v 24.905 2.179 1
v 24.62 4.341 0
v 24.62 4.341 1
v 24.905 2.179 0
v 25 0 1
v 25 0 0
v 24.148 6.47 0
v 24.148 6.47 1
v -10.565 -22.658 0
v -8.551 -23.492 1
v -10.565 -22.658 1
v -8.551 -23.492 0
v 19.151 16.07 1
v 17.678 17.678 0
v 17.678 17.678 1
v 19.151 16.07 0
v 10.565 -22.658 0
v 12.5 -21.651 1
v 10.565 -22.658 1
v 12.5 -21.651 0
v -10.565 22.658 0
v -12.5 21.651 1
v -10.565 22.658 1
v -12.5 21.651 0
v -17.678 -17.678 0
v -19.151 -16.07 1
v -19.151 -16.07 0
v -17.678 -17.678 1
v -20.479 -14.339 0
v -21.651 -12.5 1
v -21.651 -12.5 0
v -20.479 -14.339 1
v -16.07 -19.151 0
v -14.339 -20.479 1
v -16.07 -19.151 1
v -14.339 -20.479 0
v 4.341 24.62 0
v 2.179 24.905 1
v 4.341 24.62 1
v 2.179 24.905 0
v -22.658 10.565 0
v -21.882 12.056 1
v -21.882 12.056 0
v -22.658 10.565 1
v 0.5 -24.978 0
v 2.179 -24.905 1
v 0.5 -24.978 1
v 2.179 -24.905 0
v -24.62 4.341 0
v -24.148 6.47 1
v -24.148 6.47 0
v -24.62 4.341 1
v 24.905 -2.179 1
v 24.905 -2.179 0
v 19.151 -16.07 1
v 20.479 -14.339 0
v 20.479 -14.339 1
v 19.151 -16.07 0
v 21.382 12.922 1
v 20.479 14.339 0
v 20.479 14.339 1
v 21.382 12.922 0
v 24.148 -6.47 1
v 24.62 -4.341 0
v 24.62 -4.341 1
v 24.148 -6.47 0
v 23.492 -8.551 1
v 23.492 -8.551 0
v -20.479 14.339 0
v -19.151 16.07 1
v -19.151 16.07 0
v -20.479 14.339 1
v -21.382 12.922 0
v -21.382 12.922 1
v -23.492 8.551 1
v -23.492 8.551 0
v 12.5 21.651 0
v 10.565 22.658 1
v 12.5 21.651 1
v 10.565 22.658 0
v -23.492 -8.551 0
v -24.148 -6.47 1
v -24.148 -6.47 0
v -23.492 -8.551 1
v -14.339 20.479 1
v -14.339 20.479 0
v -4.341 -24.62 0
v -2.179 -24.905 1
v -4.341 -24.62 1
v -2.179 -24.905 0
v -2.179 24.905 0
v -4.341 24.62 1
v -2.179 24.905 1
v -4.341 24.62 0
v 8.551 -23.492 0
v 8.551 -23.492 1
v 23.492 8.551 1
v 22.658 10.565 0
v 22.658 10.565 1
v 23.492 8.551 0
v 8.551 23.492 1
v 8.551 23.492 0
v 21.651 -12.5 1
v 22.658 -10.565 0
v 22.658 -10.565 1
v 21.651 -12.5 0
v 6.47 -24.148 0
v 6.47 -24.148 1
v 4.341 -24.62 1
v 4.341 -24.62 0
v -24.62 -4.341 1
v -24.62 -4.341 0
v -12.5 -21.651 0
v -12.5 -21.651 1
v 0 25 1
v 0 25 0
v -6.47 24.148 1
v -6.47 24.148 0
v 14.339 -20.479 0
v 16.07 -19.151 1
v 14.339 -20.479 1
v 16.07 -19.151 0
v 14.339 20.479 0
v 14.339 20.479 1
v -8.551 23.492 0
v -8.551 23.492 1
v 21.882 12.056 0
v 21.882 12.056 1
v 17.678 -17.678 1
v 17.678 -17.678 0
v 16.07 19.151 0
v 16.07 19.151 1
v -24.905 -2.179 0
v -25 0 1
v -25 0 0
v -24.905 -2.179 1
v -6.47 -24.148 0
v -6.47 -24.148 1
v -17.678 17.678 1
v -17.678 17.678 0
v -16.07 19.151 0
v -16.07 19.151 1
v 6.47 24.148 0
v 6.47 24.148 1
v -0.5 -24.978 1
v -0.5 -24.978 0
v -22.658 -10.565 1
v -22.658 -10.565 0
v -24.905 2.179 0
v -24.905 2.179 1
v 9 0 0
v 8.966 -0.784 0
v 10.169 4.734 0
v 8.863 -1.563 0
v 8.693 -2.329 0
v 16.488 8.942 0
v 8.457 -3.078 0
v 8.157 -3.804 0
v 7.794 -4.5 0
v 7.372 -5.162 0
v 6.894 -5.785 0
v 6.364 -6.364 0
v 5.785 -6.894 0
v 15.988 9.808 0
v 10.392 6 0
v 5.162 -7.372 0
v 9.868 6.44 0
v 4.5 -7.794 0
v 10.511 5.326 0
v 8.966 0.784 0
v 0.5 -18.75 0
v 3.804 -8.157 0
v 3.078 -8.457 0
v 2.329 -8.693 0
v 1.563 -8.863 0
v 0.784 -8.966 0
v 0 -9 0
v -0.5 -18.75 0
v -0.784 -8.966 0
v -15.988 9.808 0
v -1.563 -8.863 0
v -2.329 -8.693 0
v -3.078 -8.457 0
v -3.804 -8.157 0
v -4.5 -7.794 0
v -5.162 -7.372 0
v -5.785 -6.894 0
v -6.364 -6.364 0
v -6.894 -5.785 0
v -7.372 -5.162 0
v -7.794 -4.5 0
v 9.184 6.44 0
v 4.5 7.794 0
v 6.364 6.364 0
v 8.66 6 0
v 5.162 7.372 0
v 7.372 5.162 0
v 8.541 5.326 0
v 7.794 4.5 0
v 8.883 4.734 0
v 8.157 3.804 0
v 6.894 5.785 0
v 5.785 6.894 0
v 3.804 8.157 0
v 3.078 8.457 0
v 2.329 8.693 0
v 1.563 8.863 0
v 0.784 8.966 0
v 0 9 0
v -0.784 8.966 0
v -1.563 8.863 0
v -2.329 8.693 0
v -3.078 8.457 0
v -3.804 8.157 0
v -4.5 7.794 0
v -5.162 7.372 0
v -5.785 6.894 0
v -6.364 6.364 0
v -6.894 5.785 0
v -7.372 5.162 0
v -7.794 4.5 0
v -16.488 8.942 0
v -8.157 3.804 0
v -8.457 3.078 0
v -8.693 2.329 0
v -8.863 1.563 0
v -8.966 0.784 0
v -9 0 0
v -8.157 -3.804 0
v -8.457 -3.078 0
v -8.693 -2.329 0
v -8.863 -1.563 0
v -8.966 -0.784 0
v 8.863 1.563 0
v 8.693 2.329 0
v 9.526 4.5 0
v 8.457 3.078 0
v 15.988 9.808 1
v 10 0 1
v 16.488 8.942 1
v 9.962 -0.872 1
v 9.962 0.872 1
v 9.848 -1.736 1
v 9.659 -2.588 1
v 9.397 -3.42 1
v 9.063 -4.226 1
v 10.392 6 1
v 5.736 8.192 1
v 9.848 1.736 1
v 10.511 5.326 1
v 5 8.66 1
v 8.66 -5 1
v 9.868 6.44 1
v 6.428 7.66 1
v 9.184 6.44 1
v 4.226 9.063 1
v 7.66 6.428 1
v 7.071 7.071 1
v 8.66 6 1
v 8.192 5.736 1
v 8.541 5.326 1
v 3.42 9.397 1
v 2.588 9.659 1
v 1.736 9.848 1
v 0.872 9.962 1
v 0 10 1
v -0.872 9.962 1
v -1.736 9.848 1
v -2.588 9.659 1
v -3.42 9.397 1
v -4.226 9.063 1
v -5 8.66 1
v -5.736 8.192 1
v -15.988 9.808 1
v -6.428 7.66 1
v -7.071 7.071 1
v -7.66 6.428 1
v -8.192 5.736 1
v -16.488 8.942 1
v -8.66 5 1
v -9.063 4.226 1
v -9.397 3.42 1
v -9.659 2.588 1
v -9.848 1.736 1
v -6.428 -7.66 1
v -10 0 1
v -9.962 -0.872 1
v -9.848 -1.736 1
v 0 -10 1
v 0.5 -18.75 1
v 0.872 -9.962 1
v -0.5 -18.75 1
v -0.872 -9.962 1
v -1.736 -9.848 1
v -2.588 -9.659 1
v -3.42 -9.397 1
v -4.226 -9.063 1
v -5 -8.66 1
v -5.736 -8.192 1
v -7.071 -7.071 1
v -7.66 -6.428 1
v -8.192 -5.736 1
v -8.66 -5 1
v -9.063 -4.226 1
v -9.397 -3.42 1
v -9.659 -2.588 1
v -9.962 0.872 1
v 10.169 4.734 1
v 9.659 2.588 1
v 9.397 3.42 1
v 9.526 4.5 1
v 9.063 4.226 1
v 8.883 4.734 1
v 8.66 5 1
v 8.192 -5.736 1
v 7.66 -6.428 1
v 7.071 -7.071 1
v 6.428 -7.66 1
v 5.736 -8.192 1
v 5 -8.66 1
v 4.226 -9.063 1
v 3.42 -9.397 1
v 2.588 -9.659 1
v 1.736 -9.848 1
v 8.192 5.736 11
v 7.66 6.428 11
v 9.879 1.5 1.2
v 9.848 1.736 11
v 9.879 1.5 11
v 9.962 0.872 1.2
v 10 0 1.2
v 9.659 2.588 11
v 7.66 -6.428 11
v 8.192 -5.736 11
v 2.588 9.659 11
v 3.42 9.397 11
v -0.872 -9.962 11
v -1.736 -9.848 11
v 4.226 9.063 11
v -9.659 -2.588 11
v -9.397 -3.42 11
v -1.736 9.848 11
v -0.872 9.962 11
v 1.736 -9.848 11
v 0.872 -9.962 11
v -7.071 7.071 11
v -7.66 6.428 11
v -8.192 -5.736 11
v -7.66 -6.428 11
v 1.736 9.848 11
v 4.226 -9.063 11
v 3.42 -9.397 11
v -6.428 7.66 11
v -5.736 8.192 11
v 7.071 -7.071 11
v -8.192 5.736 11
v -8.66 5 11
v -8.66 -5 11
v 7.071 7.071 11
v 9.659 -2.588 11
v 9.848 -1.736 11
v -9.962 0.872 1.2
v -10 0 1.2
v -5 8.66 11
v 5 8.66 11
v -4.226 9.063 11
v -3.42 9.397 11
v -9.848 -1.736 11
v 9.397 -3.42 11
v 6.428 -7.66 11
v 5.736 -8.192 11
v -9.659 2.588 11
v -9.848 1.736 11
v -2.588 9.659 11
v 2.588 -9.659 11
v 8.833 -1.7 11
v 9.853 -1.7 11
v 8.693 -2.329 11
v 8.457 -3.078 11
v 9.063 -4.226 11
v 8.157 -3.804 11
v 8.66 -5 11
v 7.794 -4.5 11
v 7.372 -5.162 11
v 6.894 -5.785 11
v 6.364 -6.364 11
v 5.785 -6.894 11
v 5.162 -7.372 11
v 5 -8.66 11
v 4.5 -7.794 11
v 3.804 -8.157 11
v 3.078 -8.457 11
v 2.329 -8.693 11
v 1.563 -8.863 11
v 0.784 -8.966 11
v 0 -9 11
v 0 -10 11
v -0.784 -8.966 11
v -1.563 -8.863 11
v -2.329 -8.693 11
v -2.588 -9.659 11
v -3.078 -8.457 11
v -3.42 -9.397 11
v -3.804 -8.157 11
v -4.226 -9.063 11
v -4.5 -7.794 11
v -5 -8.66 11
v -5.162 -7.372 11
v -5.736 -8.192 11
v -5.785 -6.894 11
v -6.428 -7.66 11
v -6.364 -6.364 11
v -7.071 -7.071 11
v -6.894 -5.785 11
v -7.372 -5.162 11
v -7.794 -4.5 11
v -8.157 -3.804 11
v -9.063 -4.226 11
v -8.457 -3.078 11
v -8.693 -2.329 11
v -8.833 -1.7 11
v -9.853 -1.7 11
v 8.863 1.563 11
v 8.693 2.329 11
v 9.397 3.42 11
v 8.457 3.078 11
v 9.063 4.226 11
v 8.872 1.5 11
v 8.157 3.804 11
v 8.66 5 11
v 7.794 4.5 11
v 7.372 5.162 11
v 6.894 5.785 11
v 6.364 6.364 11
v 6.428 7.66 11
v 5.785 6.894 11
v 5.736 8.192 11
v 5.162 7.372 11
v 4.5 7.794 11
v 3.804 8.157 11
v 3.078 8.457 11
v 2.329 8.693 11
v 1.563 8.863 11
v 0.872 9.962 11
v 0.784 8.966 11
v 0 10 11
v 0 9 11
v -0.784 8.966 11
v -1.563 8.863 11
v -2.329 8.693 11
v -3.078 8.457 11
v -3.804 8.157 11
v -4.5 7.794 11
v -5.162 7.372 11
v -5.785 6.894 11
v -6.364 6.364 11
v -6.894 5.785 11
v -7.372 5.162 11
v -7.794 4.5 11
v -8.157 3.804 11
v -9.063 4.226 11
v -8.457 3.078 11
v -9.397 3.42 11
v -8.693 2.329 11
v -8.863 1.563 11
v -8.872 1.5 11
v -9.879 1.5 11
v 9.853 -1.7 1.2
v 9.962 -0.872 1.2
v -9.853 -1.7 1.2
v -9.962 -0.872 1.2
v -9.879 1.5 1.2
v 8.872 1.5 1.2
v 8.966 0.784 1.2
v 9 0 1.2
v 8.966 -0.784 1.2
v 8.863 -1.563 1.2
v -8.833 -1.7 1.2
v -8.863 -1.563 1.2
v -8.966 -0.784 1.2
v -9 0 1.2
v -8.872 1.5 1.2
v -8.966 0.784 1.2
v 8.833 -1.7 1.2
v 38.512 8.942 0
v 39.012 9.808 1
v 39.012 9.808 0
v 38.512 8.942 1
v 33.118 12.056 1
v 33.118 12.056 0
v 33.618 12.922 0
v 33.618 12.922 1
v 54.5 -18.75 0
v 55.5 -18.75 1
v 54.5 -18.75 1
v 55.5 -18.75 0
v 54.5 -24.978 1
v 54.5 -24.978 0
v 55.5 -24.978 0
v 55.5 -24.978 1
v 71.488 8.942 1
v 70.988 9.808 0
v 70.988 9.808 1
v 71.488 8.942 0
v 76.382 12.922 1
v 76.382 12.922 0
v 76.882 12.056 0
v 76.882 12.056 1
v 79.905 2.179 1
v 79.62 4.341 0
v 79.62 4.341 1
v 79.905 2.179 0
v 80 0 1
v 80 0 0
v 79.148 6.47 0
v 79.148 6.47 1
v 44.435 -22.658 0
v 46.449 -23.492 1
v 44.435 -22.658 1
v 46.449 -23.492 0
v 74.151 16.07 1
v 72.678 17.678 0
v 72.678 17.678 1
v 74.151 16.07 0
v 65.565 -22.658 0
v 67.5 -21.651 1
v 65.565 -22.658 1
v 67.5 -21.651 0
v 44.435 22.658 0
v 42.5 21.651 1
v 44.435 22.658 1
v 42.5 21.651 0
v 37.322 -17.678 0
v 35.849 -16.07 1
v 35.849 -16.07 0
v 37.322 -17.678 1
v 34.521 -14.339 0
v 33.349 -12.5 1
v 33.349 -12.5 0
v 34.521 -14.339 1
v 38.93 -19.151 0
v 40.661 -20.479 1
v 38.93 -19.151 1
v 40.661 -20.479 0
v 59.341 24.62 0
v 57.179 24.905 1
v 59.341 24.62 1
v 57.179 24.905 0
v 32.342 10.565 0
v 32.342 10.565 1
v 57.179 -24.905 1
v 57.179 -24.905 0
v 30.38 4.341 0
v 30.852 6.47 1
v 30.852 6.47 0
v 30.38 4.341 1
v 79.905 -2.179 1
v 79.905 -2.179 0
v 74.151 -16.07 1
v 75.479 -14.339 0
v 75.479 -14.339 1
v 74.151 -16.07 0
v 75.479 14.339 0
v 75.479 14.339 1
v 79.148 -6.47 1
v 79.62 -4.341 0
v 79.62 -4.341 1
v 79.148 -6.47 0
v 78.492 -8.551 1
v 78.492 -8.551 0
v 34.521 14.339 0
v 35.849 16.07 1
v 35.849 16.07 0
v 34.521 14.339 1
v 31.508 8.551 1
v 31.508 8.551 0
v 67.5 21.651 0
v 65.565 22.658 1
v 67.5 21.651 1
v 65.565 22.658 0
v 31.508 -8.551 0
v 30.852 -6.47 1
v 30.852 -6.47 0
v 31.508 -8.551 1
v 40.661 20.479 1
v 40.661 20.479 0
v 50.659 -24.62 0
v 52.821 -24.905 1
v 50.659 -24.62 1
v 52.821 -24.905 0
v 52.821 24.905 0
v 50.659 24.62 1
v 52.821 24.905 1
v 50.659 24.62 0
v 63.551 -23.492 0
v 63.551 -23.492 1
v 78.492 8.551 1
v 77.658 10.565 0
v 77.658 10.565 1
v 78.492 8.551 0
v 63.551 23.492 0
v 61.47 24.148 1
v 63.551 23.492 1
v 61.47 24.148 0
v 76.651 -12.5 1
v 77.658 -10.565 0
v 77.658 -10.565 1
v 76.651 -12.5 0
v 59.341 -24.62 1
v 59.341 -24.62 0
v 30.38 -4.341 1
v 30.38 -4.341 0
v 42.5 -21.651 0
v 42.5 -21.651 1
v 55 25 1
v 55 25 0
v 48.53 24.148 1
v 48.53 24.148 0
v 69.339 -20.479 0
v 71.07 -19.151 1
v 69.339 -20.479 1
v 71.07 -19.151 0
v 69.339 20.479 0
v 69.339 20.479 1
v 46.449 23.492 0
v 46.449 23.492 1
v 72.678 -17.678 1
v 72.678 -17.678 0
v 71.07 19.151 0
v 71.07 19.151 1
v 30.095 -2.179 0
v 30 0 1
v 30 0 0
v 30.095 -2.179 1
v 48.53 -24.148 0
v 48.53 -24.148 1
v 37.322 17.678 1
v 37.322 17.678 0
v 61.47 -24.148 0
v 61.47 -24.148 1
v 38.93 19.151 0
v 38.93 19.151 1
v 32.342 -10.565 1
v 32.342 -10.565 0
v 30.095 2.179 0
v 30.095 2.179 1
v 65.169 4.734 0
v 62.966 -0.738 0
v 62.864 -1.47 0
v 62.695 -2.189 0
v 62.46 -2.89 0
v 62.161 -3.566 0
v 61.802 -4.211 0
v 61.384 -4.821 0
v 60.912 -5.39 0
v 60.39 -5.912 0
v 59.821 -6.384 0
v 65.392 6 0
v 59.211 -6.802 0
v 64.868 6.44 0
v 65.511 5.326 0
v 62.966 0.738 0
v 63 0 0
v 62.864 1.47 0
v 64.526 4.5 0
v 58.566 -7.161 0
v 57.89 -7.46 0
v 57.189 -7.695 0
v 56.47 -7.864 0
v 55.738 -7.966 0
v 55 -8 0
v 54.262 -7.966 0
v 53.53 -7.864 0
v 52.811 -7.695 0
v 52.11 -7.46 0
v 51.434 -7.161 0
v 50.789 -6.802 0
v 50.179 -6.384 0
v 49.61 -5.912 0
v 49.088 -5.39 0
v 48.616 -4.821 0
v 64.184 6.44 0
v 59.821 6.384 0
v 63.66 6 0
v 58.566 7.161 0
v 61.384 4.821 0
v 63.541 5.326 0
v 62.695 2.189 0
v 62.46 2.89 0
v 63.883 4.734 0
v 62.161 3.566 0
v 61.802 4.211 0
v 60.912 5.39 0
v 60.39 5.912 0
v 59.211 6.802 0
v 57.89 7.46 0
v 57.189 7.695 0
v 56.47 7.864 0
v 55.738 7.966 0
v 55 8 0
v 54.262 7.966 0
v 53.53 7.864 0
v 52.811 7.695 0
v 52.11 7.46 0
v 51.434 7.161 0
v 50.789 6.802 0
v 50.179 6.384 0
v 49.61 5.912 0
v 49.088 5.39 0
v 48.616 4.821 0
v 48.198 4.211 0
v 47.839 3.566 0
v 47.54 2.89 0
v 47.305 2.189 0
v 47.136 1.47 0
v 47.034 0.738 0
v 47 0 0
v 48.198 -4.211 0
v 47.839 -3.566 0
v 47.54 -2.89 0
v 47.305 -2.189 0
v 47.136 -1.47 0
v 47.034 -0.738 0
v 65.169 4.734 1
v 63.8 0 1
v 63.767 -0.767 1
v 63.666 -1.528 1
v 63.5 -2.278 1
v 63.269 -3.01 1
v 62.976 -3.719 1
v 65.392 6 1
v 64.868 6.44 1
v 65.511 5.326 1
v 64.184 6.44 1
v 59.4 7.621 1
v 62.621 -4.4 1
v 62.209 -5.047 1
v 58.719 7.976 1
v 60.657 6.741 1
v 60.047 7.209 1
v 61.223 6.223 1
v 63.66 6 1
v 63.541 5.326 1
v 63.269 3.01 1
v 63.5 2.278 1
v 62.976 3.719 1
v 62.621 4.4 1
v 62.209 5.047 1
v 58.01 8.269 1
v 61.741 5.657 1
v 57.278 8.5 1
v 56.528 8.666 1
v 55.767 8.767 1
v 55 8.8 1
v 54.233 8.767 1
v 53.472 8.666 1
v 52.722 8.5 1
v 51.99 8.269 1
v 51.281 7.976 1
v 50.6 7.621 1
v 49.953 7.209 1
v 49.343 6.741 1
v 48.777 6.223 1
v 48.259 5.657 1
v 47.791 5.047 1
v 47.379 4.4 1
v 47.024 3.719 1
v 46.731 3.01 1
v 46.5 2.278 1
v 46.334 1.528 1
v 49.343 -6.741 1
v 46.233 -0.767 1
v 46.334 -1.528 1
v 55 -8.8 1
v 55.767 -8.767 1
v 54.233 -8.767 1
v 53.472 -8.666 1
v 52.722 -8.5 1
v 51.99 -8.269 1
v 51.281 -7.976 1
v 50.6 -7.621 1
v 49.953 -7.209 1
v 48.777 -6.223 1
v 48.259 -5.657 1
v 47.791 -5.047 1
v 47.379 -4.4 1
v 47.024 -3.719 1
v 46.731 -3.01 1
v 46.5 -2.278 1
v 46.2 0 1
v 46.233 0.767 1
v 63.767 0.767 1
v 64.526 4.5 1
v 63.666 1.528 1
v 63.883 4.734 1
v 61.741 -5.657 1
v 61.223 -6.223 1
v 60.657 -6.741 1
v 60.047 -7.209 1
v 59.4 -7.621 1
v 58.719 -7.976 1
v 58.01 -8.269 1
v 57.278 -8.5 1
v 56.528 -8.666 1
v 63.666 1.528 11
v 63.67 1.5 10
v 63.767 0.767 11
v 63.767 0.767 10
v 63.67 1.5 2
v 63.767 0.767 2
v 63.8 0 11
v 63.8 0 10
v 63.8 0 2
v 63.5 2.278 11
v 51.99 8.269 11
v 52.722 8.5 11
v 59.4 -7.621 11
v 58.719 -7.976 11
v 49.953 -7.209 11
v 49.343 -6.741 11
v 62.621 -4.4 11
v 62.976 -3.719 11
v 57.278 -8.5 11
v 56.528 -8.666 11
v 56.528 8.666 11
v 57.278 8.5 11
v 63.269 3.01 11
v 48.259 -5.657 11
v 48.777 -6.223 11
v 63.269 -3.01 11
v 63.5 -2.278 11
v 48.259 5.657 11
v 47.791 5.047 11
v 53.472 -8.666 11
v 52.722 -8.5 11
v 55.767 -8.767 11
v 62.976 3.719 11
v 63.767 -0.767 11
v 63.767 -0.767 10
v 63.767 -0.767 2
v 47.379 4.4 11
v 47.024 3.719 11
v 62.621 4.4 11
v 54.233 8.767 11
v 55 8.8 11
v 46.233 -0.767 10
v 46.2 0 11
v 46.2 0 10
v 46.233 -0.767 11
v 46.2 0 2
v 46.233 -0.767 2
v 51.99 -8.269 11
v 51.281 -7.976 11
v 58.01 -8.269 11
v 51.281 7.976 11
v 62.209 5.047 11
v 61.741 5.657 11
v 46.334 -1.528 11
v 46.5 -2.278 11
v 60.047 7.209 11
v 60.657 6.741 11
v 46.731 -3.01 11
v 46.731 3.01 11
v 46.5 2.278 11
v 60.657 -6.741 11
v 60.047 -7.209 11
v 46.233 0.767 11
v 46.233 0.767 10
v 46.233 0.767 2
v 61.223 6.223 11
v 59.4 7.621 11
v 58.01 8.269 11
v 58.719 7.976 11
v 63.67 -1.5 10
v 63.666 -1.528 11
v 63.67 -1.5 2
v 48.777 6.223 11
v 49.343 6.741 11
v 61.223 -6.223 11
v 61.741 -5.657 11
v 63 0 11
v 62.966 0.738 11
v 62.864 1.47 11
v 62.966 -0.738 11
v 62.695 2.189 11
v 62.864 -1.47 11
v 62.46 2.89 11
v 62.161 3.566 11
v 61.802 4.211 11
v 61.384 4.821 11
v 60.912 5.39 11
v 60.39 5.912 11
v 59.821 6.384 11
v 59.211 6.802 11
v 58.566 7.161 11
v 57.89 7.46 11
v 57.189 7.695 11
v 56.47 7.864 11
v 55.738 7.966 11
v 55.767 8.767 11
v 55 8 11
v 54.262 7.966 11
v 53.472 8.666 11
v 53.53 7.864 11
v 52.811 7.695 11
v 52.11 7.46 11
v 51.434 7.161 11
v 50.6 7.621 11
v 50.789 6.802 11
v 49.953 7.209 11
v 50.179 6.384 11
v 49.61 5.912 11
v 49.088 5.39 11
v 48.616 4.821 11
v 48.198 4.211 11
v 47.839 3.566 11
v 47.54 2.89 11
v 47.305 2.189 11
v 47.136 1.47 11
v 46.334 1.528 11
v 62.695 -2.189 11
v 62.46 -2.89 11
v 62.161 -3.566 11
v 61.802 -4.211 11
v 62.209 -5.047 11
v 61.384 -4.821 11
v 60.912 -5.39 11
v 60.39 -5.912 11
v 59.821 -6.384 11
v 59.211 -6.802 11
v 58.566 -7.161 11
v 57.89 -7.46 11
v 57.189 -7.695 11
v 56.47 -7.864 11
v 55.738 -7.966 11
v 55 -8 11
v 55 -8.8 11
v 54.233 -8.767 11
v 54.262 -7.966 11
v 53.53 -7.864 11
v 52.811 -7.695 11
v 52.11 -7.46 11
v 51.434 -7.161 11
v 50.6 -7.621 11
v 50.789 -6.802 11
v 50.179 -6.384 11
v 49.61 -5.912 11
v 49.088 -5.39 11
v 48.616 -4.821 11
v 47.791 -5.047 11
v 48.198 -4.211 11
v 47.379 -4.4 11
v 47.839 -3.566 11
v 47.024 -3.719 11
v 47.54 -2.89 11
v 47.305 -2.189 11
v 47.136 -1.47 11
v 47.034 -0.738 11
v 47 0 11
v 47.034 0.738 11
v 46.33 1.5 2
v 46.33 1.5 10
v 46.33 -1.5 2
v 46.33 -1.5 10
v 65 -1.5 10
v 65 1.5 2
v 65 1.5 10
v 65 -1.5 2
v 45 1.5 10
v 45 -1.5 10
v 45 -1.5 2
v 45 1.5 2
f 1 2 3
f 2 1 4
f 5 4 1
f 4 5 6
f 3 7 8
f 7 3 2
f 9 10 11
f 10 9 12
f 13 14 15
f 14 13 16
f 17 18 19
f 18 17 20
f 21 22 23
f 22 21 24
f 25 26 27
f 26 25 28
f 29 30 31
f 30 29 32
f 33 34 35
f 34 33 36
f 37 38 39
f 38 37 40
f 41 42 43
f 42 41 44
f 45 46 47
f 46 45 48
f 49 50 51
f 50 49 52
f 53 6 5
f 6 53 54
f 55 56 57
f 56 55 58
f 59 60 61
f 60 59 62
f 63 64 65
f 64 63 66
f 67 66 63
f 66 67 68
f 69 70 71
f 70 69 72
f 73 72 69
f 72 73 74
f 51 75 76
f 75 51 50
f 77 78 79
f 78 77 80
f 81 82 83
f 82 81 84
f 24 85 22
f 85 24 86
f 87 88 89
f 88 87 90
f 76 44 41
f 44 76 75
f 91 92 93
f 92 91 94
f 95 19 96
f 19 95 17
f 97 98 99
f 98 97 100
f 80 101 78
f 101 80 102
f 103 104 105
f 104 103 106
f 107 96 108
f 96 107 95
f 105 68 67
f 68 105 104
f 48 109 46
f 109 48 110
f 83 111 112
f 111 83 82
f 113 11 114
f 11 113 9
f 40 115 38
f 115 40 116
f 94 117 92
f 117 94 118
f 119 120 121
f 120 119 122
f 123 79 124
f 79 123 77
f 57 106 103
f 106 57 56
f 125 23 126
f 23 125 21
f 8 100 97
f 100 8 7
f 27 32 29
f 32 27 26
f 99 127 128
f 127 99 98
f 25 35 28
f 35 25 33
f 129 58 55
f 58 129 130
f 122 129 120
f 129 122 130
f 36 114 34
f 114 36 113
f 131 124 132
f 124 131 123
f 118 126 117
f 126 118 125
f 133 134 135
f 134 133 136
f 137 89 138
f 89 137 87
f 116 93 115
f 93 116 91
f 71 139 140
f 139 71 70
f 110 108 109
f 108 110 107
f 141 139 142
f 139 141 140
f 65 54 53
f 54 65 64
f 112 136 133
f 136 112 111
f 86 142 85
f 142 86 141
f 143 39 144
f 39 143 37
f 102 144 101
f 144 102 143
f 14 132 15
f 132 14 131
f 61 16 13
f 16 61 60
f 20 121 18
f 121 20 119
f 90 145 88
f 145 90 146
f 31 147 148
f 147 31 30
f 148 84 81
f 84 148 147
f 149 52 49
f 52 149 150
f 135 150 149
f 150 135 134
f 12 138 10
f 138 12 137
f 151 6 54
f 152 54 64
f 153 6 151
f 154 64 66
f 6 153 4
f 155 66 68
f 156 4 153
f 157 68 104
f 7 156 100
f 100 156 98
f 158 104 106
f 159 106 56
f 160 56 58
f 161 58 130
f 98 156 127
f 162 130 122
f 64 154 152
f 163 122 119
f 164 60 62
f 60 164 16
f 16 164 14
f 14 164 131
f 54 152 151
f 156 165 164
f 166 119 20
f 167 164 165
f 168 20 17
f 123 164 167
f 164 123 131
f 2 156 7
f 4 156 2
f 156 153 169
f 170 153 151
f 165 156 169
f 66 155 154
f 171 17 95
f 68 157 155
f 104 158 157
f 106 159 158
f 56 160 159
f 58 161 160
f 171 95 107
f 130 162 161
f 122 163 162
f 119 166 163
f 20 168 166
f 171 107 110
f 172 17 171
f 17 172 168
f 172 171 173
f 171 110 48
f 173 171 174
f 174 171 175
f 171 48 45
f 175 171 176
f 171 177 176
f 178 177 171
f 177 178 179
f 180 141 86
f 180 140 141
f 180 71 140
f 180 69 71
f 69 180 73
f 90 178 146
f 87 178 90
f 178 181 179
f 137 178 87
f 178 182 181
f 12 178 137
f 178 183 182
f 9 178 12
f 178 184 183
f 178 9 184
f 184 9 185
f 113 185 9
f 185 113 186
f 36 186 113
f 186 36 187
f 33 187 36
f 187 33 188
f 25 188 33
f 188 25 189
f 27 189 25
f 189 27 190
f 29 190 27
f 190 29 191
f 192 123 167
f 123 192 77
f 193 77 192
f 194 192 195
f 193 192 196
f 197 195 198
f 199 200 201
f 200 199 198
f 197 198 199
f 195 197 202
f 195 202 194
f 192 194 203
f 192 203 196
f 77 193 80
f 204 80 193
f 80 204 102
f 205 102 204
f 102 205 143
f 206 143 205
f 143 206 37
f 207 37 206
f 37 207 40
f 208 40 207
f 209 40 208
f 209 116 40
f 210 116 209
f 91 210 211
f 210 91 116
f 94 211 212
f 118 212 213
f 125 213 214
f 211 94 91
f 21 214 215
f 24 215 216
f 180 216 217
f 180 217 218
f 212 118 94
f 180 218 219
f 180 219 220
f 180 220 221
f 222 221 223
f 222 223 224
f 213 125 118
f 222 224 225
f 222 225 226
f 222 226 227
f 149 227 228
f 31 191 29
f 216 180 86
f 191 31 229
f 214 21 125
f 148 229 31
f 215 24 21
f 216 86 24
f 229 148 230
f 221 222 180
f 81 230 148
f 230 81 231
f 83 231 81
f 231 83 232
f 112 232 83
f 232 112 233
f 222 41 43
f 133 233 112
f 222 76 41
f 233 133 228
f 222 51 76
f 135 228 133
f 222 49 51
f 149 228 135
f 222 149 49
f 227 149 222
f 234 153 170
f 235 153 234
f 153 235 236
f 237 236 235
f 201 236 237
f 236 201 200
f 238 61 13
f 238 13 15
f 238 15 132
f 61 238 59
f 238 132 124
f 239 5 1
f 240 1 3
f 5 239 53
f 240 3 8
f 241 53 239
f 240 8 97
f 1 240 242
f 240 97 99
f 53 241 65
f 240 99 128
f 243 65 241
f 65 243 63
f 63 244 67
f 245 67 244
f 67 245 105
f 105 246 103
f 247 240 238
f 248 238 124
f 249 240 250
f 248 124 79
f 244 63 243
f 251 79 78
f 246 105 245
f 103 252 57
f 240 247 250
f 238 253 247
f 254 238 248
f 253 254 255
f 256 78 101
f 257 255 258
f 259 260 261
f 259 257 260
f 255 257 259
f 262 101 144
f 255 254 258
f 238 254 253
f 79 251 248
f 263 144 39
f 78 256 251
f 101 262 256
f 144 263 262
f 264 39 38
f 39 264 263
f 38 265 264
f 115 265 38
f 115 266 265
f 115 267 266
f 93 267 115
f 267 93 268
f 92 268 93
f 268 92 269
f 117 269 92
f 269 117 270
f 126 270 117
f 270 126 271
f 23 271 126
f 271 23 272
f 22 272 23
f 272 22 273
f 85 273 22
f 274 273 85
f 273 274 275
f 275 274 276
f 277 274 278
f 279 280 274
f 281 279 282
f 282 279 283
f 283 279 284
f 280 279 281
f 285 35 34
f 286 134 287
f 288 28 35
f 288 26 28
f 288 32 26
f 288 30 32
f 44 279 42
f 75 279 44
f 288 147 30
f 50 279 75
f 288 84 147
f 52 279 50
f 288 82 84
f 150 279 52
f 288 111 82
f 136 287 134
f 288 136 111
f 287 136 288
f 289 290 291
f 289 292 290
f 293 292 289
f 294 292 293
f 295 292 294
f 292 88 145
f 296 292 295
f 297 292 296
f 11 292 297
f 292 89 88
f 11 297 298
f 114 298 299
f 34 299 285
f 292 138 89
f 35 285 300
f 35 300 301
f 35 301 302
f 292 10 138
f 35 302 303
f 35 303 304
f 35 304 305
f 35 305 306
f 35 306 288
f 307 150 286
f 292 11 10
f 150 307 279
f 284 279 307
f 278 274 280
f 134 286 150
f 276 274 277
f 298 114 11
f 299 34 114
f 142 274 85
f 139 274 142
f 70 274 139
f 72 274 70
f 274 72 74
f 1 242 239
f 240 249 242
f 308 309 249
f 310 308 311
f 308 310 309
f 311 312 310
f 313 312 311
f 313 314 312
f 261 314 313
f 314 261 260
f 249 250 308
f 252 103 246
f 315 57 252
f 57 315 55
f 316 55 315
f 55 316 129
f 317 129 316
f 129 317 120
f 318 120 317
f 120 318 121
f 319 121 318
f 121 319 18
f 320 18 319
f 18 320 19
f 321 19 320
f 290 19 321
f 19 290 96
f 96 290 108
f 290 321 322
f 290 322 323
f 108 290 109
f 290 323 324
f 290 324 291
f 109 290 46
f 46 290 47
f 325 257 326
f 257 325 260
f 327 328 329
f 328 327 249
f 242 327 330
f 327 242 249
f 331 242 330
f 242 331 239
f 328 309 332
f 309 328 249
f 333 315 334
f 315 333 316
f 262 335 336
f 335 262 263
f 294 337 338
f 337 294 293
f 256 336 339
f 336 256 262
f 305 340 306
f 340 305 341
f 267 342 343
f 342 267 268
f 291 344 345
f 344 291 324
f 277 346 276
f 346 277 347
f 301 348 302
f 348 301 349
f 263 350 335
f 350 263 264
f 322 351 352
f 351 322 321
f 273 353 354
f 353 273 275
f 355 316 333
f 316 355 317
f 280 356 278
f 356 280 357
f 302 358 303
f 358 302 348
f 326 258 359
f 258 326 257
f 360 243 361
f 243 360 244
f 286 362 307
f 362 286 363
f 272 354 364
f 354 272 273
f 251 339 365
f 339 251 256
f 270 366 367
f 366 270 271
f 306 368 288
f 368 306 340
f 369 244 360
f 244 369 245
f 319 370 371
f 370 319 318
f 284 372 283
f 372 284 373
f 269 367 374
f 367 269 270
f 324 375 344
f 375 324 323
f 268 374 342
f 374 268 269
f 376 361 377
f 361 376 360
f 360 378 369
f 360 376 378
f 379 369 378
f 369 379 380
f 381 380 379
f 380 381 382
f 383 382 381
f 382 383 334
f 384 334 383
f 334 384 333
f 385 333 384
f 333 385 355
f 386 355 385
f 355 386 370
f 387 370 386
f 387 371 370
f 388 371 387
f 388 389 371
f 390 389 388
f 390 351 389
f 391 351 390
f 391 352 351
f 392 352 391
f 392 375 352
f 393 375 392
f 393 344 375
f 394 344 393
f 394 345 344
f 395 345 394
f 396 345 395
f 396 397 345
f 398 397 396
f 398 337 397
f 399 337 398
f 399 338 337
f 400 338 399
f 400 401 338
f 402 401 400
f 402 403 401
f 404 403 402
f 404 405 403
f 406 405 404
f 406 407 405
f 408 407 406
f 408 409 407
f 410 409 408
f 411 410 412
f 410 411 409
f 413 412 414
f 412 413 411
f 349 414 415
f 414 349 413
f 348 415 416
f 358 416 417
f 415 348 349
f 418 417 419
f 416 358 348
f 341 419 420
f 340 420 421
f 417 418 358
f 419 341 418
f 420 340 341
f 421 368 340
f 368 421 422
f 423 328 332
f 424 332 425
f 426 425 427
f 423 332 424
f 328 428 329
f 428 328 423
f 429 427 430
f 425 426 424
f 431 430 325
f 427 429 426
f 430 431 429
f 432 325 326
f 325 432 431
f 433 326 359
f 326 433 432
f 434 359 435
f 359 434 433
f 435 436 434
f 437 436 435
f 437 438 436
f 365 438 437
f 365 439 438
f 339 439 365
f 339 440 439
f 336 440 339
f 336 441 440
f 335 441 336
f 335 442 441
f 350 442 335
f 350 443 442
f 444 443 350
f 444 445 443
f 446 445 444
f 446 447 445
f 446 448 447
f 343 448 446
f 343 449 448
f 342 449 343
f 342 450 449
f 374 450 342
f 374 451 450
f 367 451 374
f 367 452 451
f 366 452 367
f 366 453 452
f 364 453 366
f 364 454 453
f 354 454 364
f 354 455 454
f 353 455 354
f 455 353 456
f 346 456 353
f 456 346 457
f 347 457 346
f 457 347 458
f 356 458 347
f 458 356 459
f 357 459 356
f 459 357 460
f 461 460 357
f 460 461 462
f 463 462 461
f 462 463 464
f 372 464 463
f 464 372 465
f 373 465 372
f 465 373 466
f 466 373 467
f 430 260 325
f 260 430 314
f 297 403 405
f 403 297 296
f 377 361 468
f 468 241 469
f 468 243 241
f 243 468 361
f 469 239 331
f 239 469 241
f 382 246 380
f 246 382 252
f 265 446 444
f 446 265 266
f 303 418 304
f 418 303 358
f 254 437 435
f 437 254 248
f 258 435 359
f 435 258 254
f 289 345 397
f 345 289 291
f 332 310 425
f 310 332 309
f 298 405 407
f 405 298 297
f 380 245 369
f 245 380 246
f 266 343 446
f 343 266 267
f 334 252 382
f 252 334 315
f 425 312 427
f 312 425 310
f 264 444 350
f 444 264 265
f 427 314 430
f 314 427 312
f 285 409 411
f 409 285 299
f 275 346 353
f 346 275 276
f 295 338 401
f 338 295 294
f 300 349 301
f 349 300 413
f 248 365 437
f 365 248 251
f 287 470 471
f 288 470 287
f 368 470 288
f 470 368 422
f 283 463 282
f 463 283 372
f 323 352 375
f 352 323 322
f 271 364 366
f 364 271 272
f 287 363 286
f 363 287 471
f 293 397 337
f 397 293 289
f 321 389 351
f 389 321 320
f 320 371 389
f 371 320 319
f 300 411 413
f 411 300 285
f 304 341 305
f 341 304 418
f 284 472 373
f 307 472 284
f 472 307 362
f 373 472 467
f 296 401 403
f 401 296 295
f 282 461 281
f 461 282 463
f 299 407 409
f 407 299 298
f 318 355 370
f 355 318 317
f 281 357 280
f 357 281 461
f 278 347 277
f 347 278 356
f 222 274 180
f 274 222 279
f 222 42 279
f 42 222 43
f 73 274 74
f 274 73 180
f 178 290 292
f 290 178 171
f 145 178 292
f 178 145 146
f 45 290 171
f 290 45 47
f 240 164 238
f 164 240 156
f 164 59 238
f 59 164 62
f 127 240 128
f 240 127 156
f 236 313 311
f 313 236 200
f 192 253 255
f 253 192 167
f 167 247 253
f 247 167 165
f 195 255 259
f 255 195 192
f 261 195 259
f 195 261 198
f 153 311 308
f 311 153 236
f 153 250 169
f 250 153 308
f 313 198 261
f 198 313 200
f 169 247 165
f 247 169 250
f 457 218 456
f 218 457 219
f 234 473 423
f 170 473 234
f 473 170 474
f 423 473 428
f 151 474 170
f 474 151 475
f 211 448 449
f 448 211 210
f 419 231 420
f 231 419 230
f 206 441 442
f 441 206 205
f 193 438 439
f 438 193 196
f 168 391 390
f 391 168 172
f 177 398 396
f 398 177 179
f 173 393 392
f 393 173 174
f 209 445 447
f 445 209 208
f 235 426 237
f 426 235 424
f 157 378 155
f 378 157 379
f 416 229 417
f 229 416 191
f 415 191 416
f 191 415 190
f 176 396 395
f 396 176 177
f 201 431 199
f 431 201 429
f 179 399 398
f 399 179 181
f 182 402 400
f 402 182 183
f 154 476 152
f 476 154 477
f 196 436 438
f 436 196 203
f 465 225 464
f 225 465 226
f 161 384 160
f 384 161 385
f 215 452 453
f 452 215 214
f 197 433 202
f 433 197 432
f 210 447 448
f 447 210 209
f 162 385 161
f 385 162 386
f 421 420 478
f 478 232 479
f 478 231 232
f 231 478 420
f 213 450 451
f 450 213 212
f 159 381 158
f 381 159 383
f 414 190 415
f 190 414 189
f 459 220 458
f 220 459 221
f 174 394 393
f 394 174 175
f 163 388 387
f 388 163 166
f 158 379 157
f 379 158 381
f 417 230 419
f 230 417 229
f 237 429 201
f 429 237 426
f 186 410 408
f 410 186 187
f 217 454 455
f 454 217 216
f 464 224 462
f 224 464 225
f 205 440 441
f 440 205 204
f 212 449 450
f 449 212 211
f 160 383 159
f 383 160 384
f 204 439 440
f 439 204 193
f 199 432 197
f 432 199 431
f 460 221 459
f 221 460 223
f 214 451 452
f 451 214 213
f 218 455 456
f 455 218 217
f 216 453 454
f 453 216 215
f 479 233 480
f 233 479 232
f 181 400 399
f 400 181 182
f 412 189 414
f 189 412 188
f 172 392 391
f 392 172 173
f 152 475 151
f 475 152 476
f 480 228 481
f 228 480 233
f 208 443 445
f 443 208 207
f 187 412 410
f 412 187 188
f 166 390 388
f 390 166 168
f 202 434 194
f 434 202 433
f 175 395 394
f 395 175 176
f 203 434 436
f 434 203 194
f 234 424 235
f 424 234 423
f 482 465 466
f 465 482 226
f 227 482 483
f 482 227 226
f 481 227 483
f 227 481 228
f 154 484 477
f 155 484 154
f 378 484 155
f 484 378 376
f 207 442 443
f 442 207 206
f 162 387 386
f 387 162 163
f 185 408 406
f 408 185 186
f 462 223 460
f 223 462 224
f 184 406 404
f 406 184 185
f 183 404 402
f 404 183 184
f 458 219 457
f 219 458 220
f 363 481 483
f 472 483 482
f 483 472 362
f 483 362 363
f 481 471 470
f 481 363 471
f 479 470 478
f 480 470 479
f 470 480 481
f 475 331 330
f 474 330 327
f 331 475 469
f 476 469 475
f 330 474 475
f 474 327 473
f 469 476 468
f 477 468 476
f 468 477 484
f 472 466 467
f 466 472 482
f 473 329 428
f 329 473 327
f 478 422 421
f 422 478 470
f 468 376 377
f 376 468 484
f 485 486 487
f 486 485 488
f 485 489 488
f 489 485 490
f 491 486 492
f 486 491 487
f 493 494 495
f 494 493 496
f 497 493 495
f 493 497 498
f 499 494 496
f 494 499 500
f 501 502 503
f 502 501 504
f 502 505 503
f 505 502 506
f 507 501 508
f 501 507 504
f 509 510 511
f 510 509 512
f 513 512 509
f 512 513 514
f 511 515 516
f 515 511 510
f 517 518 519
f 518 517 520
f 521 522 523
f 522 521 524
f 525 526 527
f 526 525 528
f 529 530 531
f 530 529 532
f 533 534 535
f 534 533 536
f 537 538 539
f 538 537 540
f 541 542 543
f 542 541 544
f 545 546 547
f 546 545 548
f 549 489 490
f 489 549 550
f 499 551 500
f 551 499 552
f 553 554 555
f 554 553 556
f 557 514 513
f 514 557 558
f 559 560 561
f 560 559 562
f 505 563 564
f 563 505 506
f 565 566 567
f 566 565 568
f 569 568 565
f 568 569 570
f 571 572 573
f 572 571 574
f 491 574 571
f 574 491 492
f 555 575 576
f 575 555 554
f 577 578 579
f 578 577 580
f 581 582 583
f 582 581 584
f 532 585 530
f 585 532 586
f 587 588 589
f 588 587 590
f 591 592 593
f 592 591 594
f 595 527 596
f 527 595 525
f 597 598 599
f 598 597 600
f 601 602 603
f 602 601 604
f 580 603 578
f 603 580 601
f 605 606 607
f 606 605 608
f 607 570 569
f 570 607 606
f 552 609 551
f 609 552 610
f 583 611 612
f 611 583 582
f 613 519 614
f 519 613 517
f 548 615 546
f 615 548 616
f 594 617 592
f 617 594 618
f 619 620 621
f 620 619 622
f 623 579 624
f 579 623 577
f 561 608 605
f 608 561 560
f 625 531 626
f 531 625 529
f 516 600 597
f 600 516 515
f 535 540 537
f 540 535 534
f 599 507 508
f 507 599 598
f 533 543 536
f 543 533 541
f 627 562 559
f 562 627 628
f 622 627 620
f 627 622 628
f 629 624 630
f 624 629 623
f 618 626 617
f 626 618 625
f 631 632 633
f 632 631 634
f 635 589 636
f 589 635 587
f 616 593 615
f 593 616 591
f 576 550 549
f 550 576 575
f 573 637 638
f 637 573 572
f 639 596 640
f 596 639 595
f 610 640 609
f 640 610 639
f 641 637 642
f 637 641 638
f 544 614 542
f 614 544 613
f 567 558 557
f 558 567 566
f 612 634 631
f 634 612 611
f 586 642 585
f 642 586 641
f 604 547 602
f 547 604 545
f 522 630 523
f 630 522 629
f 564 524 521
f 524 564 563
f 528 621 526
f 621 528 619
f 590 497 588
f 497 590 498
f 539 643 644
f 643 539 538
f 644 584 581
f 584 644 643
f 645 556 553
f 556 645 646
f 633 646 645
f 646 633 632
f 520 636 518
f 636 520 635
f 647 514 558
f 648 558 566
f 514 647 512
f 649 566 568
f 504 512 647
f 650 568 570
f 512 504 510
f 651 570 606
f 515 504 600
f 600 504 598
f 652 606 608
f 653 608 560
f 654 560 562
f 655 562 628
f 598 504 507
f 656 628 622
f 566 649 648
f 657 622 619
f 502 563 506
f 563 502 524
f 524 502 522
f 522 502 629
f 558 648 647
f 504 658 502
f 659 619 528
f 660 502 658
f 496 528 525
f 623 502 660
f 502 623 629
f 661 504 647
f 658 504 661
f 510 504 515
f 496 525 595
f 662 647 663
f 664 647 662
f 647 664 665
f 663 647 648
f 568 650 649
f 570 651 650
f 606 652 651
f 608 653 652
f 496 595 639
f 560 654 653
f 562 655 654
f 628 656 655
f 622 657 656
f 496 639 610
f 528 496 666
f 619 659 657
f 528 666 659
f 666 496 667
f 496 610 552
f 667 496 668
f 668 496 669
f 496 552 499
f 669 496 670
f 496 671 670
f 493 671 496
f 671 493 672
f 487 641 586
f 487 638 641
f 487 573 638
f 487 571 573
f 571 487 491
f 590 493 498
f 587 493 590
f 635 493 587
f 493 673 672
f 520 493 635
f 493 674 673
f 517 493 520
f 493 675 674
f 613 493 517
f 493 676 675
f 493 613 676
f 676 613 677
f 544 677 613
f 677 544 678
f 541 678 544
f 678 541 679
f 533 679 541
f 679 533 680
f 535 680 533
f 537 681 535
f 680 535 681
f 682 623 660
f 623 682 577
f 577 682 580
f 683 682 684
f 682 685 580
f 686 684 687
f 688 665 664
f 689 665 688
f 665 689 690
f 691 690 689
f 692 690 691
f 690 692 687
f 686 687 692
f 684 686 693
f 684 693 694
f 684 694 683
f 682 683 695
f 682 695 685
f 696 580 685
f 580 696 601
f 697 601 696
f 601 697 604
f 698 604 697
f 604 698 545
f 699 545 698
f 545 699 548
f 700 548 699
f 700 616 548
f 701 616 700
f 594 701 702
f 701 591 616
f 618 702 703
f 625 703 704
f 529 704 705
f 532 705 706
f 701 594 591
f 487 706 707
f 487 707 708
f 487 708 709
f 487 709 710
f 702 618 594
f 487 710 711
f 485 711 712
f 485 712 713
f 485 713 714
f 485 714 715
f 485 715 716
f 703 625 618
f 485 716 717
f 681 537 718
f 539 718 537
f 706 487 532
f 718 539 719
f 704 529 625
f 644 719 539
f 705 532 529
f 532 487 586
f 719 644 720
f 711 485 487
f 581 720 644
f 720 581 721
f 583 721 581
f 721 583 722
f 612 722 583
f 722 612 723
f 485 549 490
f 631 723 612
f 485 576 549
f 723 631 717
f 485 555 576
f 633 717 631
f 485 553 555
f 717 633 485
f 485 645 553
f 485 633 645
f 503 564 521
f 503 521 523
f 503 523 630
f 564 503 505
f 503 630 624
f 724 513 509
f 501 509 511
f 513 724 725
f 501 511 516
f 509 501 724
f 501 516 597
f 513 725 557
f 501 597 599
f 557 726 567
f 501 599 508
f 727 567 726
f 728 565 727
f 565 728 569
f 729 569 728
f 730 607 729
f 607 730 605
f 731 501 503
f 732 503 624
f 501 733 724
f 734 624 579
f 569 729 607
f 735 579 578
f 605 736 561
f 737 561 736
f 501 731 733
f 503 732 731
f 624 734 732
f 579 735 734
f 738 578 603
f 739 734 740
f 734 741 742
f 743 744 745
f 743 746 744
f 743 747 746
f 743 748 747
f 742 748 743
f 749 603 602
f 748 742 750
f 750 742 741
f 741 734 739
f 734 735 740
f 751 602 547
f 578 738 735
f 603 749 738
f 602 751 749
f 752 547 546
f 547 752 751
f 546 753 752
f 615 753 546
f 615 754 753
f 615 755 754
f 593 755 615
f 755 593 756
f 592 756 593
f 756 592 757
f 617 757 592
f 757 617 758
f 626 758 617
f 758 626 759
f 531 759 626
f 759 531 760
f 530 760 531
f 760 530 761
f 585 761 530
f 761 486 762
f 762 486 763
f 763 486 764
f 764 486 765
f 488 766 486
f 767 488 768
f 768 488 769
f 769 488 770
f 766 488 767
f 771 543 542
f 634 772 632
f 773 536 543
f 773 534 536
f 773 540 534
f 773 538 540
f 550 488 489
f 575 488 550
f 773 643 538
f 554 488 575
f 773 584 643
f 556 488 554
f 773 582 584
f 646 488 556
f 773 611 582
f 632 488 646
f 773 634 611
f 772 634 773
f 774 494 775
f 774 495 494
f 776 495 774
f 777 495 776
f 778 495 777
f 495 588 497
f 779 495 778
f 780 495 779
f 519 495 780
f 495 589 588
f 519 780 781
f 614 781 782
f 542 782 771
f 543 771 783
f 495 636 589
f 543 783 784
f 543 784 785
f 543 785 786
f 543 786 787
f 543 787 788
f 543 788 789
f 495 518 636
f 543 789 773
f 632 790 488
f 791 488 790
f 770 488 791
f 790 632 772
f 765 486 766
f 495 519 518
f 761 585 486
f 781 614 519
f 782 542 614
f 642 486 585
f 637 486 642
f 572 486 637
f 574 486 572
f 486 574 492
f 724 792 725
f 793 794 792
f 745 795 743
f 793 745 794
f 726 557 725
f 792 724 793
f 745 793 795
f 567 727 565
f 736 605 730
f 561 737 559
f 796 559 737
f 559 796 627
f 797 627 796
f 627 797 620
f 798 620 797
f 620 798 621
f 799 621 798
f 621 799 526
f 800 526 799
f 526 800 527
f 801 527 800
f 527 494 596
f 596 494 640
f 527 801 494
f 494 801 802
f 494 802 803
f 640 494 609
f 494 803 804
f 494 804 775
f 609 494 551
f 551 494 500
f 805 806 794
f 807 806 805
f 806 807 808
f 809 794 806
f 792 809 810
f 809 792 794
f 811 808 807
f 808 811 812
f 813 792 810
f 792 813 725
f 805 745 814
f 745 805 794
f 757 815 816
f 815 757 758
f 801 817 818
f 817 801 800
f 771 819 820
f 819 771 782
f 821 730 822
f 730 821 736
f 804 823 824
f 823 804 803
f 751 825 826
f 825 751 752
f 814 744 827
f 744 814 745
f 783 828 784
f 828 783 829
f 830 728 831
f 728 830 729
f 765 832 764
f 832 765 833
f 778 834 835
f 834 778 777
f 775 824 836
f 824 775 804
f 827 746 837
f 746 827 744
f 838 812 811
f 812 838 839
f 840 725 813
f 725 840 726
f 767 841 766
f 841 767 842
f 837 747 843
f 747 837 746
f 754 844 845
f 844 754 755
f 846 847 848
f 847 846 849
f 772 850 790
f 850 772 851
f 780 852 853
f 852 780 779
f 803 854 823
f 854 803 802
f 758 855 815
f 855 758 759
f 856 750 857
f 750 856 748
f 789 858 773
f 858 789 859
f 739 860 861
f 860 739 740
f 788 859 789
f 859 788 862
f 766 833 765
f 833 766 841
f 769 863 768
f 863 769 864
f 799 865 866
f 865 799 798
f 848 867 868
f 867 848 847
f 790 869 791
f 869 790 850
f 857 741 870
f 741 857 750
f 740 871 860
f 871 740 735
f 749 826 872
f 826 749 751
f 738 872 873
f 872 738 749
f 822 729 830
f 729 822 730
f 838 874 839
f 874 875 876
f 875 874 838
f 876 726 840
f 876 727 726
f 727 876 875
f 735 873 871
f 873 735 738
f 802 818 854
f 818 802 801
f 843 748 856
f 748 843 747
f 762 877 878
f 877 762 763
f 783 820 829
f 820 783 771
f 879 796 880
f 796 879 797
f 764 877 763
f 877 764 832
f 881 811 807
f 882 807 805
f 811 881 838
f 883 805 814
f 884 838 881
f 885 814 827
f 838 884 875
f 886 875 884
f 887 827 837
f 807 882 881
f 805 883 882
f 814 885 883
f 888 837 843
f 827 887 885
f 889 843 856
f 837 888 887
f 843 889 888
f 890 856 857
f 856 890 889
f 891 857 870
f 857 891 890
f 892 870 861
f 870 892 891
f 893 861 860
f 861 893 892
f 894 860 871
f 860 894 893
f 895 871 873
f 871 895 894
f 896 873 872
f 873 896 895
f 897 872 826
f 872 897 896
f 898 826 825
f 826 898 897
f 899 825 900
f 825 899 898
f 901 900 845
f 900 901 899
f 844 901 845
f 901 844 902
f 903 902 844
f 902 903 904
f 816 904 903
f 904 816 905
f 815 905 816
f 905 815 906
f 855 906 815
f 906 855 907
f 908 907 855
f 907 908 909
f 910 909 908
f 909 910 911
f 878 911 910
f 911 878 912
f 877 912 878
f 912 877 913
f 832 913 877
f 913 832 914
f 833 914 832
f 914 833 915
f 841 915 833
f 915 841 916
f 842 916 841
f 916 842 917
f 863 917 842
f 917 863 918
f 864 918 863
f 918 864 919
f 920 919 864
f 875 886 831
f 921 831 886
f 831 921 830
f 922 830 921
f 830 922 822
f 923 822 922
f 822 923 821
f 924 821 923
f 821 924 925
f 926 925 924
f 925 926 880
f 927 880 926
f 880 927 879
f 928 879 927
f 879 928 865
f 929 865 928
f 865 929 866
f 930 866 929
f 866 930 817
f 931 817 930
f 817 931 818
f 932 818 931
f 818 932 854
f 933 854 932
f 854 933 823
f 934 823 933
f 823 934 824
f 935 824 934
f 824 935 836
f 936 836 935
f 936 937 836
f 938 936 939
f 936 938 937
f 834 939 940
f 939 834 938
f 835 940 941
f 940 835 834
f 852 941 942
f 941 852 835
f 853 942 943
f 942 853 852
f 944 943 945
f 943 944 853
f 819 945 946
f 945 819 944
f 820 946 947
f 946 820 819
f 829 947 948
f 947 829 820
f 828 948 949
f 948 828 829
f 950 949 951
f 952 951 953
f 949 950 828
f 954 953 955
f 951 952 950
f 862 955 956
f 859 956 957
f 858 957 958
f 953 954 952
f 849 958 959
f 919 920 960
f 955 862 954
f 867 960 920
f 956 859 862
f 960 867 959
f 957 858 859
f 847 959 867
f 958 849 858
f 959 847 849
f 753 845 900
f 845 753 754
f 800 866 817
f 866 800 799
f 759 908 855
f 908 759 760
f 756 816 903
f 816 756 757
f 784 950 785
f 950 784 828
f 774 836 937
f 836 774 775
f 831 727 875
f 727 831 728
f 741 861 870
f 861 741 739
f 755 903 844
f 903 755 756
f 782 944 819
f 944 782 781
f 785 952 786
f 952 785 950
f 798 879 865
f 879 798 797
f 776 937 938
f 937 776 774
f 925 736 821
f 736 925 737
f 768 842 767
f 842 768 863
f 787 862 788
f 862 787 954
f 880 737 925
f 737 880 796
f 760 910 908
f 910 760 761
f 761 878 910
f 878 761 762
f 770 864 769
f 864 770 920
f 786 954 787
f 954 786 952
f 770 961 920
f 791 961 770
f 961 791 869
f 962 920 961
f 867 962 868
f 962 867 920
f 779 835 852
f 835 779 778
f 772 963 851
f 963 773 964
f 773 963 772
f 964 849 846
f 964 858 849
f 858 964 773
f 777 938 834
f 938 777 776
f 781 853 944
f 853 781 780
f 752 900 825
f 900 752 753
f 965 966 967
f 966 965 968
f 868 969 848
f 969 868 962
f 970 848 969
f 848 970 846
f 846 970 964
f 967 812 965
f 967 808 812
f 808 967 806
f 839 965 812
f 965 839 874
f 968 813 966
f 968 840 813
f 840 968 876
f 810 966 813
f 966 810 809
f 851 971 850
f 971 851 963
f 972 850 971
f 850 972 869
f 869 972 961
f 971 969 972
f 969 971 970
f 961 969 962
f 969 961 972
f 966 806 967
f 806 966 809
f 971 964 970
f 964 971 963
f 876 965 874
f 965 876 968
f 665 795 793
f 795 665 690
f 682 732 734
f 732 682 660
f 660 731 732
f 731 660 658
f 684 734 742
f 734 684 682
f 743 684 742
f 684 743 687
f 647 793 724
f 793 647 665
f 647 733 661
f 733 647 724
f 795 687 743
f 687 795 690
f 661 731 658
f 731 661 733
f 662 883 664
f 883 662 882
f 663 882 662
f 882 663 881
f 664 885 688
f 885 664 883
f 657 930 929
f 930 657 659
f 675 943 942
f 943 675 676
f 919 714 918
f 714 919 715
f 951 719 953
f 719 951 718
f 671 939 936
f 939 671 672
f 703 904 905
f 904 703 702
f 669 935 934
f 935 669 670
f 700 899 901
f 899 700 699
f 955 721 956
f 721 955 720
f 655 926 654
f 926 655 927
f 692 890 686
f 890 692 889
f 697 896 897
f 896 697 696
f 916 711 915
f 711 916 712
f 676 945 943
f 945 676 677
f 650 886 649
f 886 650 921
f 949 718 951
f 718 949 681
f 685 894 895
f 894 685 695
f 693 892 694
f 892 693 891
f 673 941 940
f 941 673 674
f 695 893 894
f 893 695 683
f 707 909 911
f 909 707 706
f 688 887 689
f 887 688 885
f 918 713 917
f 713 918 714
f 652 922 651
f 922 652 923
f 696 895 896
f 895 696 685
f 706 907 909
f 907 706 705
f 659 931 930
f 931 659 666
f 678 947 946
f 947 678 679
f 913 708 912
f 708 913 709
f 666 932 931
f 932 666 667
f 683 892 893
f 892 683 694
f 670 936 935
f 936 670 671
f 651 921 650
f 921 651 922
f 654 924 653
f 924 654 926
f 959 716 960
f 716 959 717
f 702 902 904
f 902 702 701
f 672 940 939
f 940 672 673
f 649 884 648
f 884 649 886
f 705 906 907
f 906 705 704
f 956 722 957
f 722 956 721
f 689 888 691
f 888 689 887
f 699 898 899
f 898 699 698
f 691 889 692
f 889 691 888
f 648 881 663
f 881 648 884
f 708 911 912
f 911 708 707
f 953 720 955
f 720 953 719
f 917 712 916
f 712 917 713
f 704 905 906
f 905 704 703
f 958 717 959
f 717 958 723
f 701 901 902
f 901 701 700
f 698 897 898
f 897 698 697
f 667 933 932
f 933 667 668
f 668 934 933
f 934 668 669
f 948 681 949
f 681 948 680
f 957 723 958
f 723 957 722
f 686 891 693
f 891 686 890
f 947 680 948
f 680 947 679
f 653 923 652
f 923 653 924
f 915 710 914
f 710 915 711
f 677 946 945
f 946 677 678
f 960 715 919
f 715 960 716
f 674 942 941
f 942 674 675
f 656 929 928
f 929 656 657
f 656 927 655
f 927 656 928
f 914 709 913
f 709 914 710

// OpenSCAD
/*
Author: Avp (Alexander Purikov)
Design is based on Ben Wittbrodt one: http://www.thingiverse.com/thing:435802
*/

/*[Customizer Variables]*/

//Which part would you like to render?
part			=	"both"; //[top:Top, bottom:Bottom, both:Both]
//Diameter of the outer guard for the spooler
big_diameter	=	50;	//[40:160]
//Thickness of the flange and spool walls
flange_thick	=	1;	//[1:4]	
//Diameter of the middle spool cylinder
cylinder_diameter	=	20;	//[10:40]
//Width of the winding area (where the wire will be)
winding_thick	=	10;	//[5:50]
//Width of the slots and holes for fastening wire ends
gaps_width		=	1; //[0:3]
//Diameter of the circle cutouts on outer guard
cut_diameter	=	0;	//[0:9]


/*[hidden]*/
$fa=5; $fs=0.75;
Clearance = 0.2;


big_radius = big_diameter/2;
small_radius = (cylinder_diameter-flange_thick*2)/2;
cut_radius = cut_diameter/2;

output();

module output()
{
	if (part == "top") {
		top();
	} else if (part == "bottom") {
		bottom();
	} else if (part == "both") {
		top();
		translate([big_radius*2+5,0,0])
		bottom();
	} 
}

module top()
{
	difference()
	{
		union()
		{
			cylinder(r=big_radius, h=flange_thick); //Outer flange

			cylinder(r=small_radius+flange_thick, h=flange_thick+winding_thick);	//Inner cylinder
		}

		for (i=[1:6])
		{
			rotate([0,0,60*i])
			translate([big_radius/2+cut_radius,0,-.1])
				cylinder(r=cut_radius,h=flange_thick+.2); //Flange cutouts
		}
		for (i=[1:3])
		{
			rotate([0,0,120*i+30])
				translate ([big_radius,0,0])
					cube ([big_radius/2,gaps_width,flange_thick*2+0.2], center=true);
		}

		if ( gaps_width > 0 )
		{
			rotate([0,0,30])
					translate ([small_radius+2/2+flange_thick,0,-0.1])
						cylinder ( r=(gaps_width<2) ? 1 : gaps_width/2, h=flange_thick+0.2 );
			
			translate([0,0,-.15])
				cylinder(r=small_radius, h=winding_thick+flange_thick*2+0.2);	//inner radius cutout
		}
		translate([-small_radius-flange_thick,-1.7,flange_thick*1+0.2])
			cube([small_radius*2+(2*flange_thick)+Clearance,3.2,winding_thick]);		//locking slot
	}
}

module bottom()
{
	difference()
	{
		union()
		{
			cylinder(r=big_radius, h=flange_thick);	//Outer flange
			cylinder(r=small_radius-Clearance, h=flange_thick+winding_thick);	//Inner cylinder

			translate([-small_radius-flange_thick,-1.5,flange_thick*2])
				cube([small_radius*2+(2*flange_thick),3,winding_thick-(flange_thick*2)]);  //locking tabs
		}

		for (i=[1:6])
		{
			rotate([0,0,60*i])
			translate([big_radius/2+cut_radius,0,-.1])
				cylinder(r=cut_radius,h=flange_thick+.2); //Flange cutouts
		}

		if ( gaps_width > 0 )
		{
			for (i=[1:3])
			{
				rotate([0,0,120*i+30])
					translate ([big_radius,0,0])
						cube ([big_radius/2,gaps_width,flange_thick*2+0.2], center=true);
			}
			
			rotate([0,0,30])
					translate ([small_radius+2/2+flange_thick,0,-0.1])
						cylinder ( r=(gaps_width<2) ? 1 : gaps_width/2, h=flange_thick+0.2 );
			}
		translate([0,0,-.15])
		cylinder(r=small_radius-flange_thick, h=winding_thick+flange_thick*2+0.2); //Inner cylinder cutout
	}
}
